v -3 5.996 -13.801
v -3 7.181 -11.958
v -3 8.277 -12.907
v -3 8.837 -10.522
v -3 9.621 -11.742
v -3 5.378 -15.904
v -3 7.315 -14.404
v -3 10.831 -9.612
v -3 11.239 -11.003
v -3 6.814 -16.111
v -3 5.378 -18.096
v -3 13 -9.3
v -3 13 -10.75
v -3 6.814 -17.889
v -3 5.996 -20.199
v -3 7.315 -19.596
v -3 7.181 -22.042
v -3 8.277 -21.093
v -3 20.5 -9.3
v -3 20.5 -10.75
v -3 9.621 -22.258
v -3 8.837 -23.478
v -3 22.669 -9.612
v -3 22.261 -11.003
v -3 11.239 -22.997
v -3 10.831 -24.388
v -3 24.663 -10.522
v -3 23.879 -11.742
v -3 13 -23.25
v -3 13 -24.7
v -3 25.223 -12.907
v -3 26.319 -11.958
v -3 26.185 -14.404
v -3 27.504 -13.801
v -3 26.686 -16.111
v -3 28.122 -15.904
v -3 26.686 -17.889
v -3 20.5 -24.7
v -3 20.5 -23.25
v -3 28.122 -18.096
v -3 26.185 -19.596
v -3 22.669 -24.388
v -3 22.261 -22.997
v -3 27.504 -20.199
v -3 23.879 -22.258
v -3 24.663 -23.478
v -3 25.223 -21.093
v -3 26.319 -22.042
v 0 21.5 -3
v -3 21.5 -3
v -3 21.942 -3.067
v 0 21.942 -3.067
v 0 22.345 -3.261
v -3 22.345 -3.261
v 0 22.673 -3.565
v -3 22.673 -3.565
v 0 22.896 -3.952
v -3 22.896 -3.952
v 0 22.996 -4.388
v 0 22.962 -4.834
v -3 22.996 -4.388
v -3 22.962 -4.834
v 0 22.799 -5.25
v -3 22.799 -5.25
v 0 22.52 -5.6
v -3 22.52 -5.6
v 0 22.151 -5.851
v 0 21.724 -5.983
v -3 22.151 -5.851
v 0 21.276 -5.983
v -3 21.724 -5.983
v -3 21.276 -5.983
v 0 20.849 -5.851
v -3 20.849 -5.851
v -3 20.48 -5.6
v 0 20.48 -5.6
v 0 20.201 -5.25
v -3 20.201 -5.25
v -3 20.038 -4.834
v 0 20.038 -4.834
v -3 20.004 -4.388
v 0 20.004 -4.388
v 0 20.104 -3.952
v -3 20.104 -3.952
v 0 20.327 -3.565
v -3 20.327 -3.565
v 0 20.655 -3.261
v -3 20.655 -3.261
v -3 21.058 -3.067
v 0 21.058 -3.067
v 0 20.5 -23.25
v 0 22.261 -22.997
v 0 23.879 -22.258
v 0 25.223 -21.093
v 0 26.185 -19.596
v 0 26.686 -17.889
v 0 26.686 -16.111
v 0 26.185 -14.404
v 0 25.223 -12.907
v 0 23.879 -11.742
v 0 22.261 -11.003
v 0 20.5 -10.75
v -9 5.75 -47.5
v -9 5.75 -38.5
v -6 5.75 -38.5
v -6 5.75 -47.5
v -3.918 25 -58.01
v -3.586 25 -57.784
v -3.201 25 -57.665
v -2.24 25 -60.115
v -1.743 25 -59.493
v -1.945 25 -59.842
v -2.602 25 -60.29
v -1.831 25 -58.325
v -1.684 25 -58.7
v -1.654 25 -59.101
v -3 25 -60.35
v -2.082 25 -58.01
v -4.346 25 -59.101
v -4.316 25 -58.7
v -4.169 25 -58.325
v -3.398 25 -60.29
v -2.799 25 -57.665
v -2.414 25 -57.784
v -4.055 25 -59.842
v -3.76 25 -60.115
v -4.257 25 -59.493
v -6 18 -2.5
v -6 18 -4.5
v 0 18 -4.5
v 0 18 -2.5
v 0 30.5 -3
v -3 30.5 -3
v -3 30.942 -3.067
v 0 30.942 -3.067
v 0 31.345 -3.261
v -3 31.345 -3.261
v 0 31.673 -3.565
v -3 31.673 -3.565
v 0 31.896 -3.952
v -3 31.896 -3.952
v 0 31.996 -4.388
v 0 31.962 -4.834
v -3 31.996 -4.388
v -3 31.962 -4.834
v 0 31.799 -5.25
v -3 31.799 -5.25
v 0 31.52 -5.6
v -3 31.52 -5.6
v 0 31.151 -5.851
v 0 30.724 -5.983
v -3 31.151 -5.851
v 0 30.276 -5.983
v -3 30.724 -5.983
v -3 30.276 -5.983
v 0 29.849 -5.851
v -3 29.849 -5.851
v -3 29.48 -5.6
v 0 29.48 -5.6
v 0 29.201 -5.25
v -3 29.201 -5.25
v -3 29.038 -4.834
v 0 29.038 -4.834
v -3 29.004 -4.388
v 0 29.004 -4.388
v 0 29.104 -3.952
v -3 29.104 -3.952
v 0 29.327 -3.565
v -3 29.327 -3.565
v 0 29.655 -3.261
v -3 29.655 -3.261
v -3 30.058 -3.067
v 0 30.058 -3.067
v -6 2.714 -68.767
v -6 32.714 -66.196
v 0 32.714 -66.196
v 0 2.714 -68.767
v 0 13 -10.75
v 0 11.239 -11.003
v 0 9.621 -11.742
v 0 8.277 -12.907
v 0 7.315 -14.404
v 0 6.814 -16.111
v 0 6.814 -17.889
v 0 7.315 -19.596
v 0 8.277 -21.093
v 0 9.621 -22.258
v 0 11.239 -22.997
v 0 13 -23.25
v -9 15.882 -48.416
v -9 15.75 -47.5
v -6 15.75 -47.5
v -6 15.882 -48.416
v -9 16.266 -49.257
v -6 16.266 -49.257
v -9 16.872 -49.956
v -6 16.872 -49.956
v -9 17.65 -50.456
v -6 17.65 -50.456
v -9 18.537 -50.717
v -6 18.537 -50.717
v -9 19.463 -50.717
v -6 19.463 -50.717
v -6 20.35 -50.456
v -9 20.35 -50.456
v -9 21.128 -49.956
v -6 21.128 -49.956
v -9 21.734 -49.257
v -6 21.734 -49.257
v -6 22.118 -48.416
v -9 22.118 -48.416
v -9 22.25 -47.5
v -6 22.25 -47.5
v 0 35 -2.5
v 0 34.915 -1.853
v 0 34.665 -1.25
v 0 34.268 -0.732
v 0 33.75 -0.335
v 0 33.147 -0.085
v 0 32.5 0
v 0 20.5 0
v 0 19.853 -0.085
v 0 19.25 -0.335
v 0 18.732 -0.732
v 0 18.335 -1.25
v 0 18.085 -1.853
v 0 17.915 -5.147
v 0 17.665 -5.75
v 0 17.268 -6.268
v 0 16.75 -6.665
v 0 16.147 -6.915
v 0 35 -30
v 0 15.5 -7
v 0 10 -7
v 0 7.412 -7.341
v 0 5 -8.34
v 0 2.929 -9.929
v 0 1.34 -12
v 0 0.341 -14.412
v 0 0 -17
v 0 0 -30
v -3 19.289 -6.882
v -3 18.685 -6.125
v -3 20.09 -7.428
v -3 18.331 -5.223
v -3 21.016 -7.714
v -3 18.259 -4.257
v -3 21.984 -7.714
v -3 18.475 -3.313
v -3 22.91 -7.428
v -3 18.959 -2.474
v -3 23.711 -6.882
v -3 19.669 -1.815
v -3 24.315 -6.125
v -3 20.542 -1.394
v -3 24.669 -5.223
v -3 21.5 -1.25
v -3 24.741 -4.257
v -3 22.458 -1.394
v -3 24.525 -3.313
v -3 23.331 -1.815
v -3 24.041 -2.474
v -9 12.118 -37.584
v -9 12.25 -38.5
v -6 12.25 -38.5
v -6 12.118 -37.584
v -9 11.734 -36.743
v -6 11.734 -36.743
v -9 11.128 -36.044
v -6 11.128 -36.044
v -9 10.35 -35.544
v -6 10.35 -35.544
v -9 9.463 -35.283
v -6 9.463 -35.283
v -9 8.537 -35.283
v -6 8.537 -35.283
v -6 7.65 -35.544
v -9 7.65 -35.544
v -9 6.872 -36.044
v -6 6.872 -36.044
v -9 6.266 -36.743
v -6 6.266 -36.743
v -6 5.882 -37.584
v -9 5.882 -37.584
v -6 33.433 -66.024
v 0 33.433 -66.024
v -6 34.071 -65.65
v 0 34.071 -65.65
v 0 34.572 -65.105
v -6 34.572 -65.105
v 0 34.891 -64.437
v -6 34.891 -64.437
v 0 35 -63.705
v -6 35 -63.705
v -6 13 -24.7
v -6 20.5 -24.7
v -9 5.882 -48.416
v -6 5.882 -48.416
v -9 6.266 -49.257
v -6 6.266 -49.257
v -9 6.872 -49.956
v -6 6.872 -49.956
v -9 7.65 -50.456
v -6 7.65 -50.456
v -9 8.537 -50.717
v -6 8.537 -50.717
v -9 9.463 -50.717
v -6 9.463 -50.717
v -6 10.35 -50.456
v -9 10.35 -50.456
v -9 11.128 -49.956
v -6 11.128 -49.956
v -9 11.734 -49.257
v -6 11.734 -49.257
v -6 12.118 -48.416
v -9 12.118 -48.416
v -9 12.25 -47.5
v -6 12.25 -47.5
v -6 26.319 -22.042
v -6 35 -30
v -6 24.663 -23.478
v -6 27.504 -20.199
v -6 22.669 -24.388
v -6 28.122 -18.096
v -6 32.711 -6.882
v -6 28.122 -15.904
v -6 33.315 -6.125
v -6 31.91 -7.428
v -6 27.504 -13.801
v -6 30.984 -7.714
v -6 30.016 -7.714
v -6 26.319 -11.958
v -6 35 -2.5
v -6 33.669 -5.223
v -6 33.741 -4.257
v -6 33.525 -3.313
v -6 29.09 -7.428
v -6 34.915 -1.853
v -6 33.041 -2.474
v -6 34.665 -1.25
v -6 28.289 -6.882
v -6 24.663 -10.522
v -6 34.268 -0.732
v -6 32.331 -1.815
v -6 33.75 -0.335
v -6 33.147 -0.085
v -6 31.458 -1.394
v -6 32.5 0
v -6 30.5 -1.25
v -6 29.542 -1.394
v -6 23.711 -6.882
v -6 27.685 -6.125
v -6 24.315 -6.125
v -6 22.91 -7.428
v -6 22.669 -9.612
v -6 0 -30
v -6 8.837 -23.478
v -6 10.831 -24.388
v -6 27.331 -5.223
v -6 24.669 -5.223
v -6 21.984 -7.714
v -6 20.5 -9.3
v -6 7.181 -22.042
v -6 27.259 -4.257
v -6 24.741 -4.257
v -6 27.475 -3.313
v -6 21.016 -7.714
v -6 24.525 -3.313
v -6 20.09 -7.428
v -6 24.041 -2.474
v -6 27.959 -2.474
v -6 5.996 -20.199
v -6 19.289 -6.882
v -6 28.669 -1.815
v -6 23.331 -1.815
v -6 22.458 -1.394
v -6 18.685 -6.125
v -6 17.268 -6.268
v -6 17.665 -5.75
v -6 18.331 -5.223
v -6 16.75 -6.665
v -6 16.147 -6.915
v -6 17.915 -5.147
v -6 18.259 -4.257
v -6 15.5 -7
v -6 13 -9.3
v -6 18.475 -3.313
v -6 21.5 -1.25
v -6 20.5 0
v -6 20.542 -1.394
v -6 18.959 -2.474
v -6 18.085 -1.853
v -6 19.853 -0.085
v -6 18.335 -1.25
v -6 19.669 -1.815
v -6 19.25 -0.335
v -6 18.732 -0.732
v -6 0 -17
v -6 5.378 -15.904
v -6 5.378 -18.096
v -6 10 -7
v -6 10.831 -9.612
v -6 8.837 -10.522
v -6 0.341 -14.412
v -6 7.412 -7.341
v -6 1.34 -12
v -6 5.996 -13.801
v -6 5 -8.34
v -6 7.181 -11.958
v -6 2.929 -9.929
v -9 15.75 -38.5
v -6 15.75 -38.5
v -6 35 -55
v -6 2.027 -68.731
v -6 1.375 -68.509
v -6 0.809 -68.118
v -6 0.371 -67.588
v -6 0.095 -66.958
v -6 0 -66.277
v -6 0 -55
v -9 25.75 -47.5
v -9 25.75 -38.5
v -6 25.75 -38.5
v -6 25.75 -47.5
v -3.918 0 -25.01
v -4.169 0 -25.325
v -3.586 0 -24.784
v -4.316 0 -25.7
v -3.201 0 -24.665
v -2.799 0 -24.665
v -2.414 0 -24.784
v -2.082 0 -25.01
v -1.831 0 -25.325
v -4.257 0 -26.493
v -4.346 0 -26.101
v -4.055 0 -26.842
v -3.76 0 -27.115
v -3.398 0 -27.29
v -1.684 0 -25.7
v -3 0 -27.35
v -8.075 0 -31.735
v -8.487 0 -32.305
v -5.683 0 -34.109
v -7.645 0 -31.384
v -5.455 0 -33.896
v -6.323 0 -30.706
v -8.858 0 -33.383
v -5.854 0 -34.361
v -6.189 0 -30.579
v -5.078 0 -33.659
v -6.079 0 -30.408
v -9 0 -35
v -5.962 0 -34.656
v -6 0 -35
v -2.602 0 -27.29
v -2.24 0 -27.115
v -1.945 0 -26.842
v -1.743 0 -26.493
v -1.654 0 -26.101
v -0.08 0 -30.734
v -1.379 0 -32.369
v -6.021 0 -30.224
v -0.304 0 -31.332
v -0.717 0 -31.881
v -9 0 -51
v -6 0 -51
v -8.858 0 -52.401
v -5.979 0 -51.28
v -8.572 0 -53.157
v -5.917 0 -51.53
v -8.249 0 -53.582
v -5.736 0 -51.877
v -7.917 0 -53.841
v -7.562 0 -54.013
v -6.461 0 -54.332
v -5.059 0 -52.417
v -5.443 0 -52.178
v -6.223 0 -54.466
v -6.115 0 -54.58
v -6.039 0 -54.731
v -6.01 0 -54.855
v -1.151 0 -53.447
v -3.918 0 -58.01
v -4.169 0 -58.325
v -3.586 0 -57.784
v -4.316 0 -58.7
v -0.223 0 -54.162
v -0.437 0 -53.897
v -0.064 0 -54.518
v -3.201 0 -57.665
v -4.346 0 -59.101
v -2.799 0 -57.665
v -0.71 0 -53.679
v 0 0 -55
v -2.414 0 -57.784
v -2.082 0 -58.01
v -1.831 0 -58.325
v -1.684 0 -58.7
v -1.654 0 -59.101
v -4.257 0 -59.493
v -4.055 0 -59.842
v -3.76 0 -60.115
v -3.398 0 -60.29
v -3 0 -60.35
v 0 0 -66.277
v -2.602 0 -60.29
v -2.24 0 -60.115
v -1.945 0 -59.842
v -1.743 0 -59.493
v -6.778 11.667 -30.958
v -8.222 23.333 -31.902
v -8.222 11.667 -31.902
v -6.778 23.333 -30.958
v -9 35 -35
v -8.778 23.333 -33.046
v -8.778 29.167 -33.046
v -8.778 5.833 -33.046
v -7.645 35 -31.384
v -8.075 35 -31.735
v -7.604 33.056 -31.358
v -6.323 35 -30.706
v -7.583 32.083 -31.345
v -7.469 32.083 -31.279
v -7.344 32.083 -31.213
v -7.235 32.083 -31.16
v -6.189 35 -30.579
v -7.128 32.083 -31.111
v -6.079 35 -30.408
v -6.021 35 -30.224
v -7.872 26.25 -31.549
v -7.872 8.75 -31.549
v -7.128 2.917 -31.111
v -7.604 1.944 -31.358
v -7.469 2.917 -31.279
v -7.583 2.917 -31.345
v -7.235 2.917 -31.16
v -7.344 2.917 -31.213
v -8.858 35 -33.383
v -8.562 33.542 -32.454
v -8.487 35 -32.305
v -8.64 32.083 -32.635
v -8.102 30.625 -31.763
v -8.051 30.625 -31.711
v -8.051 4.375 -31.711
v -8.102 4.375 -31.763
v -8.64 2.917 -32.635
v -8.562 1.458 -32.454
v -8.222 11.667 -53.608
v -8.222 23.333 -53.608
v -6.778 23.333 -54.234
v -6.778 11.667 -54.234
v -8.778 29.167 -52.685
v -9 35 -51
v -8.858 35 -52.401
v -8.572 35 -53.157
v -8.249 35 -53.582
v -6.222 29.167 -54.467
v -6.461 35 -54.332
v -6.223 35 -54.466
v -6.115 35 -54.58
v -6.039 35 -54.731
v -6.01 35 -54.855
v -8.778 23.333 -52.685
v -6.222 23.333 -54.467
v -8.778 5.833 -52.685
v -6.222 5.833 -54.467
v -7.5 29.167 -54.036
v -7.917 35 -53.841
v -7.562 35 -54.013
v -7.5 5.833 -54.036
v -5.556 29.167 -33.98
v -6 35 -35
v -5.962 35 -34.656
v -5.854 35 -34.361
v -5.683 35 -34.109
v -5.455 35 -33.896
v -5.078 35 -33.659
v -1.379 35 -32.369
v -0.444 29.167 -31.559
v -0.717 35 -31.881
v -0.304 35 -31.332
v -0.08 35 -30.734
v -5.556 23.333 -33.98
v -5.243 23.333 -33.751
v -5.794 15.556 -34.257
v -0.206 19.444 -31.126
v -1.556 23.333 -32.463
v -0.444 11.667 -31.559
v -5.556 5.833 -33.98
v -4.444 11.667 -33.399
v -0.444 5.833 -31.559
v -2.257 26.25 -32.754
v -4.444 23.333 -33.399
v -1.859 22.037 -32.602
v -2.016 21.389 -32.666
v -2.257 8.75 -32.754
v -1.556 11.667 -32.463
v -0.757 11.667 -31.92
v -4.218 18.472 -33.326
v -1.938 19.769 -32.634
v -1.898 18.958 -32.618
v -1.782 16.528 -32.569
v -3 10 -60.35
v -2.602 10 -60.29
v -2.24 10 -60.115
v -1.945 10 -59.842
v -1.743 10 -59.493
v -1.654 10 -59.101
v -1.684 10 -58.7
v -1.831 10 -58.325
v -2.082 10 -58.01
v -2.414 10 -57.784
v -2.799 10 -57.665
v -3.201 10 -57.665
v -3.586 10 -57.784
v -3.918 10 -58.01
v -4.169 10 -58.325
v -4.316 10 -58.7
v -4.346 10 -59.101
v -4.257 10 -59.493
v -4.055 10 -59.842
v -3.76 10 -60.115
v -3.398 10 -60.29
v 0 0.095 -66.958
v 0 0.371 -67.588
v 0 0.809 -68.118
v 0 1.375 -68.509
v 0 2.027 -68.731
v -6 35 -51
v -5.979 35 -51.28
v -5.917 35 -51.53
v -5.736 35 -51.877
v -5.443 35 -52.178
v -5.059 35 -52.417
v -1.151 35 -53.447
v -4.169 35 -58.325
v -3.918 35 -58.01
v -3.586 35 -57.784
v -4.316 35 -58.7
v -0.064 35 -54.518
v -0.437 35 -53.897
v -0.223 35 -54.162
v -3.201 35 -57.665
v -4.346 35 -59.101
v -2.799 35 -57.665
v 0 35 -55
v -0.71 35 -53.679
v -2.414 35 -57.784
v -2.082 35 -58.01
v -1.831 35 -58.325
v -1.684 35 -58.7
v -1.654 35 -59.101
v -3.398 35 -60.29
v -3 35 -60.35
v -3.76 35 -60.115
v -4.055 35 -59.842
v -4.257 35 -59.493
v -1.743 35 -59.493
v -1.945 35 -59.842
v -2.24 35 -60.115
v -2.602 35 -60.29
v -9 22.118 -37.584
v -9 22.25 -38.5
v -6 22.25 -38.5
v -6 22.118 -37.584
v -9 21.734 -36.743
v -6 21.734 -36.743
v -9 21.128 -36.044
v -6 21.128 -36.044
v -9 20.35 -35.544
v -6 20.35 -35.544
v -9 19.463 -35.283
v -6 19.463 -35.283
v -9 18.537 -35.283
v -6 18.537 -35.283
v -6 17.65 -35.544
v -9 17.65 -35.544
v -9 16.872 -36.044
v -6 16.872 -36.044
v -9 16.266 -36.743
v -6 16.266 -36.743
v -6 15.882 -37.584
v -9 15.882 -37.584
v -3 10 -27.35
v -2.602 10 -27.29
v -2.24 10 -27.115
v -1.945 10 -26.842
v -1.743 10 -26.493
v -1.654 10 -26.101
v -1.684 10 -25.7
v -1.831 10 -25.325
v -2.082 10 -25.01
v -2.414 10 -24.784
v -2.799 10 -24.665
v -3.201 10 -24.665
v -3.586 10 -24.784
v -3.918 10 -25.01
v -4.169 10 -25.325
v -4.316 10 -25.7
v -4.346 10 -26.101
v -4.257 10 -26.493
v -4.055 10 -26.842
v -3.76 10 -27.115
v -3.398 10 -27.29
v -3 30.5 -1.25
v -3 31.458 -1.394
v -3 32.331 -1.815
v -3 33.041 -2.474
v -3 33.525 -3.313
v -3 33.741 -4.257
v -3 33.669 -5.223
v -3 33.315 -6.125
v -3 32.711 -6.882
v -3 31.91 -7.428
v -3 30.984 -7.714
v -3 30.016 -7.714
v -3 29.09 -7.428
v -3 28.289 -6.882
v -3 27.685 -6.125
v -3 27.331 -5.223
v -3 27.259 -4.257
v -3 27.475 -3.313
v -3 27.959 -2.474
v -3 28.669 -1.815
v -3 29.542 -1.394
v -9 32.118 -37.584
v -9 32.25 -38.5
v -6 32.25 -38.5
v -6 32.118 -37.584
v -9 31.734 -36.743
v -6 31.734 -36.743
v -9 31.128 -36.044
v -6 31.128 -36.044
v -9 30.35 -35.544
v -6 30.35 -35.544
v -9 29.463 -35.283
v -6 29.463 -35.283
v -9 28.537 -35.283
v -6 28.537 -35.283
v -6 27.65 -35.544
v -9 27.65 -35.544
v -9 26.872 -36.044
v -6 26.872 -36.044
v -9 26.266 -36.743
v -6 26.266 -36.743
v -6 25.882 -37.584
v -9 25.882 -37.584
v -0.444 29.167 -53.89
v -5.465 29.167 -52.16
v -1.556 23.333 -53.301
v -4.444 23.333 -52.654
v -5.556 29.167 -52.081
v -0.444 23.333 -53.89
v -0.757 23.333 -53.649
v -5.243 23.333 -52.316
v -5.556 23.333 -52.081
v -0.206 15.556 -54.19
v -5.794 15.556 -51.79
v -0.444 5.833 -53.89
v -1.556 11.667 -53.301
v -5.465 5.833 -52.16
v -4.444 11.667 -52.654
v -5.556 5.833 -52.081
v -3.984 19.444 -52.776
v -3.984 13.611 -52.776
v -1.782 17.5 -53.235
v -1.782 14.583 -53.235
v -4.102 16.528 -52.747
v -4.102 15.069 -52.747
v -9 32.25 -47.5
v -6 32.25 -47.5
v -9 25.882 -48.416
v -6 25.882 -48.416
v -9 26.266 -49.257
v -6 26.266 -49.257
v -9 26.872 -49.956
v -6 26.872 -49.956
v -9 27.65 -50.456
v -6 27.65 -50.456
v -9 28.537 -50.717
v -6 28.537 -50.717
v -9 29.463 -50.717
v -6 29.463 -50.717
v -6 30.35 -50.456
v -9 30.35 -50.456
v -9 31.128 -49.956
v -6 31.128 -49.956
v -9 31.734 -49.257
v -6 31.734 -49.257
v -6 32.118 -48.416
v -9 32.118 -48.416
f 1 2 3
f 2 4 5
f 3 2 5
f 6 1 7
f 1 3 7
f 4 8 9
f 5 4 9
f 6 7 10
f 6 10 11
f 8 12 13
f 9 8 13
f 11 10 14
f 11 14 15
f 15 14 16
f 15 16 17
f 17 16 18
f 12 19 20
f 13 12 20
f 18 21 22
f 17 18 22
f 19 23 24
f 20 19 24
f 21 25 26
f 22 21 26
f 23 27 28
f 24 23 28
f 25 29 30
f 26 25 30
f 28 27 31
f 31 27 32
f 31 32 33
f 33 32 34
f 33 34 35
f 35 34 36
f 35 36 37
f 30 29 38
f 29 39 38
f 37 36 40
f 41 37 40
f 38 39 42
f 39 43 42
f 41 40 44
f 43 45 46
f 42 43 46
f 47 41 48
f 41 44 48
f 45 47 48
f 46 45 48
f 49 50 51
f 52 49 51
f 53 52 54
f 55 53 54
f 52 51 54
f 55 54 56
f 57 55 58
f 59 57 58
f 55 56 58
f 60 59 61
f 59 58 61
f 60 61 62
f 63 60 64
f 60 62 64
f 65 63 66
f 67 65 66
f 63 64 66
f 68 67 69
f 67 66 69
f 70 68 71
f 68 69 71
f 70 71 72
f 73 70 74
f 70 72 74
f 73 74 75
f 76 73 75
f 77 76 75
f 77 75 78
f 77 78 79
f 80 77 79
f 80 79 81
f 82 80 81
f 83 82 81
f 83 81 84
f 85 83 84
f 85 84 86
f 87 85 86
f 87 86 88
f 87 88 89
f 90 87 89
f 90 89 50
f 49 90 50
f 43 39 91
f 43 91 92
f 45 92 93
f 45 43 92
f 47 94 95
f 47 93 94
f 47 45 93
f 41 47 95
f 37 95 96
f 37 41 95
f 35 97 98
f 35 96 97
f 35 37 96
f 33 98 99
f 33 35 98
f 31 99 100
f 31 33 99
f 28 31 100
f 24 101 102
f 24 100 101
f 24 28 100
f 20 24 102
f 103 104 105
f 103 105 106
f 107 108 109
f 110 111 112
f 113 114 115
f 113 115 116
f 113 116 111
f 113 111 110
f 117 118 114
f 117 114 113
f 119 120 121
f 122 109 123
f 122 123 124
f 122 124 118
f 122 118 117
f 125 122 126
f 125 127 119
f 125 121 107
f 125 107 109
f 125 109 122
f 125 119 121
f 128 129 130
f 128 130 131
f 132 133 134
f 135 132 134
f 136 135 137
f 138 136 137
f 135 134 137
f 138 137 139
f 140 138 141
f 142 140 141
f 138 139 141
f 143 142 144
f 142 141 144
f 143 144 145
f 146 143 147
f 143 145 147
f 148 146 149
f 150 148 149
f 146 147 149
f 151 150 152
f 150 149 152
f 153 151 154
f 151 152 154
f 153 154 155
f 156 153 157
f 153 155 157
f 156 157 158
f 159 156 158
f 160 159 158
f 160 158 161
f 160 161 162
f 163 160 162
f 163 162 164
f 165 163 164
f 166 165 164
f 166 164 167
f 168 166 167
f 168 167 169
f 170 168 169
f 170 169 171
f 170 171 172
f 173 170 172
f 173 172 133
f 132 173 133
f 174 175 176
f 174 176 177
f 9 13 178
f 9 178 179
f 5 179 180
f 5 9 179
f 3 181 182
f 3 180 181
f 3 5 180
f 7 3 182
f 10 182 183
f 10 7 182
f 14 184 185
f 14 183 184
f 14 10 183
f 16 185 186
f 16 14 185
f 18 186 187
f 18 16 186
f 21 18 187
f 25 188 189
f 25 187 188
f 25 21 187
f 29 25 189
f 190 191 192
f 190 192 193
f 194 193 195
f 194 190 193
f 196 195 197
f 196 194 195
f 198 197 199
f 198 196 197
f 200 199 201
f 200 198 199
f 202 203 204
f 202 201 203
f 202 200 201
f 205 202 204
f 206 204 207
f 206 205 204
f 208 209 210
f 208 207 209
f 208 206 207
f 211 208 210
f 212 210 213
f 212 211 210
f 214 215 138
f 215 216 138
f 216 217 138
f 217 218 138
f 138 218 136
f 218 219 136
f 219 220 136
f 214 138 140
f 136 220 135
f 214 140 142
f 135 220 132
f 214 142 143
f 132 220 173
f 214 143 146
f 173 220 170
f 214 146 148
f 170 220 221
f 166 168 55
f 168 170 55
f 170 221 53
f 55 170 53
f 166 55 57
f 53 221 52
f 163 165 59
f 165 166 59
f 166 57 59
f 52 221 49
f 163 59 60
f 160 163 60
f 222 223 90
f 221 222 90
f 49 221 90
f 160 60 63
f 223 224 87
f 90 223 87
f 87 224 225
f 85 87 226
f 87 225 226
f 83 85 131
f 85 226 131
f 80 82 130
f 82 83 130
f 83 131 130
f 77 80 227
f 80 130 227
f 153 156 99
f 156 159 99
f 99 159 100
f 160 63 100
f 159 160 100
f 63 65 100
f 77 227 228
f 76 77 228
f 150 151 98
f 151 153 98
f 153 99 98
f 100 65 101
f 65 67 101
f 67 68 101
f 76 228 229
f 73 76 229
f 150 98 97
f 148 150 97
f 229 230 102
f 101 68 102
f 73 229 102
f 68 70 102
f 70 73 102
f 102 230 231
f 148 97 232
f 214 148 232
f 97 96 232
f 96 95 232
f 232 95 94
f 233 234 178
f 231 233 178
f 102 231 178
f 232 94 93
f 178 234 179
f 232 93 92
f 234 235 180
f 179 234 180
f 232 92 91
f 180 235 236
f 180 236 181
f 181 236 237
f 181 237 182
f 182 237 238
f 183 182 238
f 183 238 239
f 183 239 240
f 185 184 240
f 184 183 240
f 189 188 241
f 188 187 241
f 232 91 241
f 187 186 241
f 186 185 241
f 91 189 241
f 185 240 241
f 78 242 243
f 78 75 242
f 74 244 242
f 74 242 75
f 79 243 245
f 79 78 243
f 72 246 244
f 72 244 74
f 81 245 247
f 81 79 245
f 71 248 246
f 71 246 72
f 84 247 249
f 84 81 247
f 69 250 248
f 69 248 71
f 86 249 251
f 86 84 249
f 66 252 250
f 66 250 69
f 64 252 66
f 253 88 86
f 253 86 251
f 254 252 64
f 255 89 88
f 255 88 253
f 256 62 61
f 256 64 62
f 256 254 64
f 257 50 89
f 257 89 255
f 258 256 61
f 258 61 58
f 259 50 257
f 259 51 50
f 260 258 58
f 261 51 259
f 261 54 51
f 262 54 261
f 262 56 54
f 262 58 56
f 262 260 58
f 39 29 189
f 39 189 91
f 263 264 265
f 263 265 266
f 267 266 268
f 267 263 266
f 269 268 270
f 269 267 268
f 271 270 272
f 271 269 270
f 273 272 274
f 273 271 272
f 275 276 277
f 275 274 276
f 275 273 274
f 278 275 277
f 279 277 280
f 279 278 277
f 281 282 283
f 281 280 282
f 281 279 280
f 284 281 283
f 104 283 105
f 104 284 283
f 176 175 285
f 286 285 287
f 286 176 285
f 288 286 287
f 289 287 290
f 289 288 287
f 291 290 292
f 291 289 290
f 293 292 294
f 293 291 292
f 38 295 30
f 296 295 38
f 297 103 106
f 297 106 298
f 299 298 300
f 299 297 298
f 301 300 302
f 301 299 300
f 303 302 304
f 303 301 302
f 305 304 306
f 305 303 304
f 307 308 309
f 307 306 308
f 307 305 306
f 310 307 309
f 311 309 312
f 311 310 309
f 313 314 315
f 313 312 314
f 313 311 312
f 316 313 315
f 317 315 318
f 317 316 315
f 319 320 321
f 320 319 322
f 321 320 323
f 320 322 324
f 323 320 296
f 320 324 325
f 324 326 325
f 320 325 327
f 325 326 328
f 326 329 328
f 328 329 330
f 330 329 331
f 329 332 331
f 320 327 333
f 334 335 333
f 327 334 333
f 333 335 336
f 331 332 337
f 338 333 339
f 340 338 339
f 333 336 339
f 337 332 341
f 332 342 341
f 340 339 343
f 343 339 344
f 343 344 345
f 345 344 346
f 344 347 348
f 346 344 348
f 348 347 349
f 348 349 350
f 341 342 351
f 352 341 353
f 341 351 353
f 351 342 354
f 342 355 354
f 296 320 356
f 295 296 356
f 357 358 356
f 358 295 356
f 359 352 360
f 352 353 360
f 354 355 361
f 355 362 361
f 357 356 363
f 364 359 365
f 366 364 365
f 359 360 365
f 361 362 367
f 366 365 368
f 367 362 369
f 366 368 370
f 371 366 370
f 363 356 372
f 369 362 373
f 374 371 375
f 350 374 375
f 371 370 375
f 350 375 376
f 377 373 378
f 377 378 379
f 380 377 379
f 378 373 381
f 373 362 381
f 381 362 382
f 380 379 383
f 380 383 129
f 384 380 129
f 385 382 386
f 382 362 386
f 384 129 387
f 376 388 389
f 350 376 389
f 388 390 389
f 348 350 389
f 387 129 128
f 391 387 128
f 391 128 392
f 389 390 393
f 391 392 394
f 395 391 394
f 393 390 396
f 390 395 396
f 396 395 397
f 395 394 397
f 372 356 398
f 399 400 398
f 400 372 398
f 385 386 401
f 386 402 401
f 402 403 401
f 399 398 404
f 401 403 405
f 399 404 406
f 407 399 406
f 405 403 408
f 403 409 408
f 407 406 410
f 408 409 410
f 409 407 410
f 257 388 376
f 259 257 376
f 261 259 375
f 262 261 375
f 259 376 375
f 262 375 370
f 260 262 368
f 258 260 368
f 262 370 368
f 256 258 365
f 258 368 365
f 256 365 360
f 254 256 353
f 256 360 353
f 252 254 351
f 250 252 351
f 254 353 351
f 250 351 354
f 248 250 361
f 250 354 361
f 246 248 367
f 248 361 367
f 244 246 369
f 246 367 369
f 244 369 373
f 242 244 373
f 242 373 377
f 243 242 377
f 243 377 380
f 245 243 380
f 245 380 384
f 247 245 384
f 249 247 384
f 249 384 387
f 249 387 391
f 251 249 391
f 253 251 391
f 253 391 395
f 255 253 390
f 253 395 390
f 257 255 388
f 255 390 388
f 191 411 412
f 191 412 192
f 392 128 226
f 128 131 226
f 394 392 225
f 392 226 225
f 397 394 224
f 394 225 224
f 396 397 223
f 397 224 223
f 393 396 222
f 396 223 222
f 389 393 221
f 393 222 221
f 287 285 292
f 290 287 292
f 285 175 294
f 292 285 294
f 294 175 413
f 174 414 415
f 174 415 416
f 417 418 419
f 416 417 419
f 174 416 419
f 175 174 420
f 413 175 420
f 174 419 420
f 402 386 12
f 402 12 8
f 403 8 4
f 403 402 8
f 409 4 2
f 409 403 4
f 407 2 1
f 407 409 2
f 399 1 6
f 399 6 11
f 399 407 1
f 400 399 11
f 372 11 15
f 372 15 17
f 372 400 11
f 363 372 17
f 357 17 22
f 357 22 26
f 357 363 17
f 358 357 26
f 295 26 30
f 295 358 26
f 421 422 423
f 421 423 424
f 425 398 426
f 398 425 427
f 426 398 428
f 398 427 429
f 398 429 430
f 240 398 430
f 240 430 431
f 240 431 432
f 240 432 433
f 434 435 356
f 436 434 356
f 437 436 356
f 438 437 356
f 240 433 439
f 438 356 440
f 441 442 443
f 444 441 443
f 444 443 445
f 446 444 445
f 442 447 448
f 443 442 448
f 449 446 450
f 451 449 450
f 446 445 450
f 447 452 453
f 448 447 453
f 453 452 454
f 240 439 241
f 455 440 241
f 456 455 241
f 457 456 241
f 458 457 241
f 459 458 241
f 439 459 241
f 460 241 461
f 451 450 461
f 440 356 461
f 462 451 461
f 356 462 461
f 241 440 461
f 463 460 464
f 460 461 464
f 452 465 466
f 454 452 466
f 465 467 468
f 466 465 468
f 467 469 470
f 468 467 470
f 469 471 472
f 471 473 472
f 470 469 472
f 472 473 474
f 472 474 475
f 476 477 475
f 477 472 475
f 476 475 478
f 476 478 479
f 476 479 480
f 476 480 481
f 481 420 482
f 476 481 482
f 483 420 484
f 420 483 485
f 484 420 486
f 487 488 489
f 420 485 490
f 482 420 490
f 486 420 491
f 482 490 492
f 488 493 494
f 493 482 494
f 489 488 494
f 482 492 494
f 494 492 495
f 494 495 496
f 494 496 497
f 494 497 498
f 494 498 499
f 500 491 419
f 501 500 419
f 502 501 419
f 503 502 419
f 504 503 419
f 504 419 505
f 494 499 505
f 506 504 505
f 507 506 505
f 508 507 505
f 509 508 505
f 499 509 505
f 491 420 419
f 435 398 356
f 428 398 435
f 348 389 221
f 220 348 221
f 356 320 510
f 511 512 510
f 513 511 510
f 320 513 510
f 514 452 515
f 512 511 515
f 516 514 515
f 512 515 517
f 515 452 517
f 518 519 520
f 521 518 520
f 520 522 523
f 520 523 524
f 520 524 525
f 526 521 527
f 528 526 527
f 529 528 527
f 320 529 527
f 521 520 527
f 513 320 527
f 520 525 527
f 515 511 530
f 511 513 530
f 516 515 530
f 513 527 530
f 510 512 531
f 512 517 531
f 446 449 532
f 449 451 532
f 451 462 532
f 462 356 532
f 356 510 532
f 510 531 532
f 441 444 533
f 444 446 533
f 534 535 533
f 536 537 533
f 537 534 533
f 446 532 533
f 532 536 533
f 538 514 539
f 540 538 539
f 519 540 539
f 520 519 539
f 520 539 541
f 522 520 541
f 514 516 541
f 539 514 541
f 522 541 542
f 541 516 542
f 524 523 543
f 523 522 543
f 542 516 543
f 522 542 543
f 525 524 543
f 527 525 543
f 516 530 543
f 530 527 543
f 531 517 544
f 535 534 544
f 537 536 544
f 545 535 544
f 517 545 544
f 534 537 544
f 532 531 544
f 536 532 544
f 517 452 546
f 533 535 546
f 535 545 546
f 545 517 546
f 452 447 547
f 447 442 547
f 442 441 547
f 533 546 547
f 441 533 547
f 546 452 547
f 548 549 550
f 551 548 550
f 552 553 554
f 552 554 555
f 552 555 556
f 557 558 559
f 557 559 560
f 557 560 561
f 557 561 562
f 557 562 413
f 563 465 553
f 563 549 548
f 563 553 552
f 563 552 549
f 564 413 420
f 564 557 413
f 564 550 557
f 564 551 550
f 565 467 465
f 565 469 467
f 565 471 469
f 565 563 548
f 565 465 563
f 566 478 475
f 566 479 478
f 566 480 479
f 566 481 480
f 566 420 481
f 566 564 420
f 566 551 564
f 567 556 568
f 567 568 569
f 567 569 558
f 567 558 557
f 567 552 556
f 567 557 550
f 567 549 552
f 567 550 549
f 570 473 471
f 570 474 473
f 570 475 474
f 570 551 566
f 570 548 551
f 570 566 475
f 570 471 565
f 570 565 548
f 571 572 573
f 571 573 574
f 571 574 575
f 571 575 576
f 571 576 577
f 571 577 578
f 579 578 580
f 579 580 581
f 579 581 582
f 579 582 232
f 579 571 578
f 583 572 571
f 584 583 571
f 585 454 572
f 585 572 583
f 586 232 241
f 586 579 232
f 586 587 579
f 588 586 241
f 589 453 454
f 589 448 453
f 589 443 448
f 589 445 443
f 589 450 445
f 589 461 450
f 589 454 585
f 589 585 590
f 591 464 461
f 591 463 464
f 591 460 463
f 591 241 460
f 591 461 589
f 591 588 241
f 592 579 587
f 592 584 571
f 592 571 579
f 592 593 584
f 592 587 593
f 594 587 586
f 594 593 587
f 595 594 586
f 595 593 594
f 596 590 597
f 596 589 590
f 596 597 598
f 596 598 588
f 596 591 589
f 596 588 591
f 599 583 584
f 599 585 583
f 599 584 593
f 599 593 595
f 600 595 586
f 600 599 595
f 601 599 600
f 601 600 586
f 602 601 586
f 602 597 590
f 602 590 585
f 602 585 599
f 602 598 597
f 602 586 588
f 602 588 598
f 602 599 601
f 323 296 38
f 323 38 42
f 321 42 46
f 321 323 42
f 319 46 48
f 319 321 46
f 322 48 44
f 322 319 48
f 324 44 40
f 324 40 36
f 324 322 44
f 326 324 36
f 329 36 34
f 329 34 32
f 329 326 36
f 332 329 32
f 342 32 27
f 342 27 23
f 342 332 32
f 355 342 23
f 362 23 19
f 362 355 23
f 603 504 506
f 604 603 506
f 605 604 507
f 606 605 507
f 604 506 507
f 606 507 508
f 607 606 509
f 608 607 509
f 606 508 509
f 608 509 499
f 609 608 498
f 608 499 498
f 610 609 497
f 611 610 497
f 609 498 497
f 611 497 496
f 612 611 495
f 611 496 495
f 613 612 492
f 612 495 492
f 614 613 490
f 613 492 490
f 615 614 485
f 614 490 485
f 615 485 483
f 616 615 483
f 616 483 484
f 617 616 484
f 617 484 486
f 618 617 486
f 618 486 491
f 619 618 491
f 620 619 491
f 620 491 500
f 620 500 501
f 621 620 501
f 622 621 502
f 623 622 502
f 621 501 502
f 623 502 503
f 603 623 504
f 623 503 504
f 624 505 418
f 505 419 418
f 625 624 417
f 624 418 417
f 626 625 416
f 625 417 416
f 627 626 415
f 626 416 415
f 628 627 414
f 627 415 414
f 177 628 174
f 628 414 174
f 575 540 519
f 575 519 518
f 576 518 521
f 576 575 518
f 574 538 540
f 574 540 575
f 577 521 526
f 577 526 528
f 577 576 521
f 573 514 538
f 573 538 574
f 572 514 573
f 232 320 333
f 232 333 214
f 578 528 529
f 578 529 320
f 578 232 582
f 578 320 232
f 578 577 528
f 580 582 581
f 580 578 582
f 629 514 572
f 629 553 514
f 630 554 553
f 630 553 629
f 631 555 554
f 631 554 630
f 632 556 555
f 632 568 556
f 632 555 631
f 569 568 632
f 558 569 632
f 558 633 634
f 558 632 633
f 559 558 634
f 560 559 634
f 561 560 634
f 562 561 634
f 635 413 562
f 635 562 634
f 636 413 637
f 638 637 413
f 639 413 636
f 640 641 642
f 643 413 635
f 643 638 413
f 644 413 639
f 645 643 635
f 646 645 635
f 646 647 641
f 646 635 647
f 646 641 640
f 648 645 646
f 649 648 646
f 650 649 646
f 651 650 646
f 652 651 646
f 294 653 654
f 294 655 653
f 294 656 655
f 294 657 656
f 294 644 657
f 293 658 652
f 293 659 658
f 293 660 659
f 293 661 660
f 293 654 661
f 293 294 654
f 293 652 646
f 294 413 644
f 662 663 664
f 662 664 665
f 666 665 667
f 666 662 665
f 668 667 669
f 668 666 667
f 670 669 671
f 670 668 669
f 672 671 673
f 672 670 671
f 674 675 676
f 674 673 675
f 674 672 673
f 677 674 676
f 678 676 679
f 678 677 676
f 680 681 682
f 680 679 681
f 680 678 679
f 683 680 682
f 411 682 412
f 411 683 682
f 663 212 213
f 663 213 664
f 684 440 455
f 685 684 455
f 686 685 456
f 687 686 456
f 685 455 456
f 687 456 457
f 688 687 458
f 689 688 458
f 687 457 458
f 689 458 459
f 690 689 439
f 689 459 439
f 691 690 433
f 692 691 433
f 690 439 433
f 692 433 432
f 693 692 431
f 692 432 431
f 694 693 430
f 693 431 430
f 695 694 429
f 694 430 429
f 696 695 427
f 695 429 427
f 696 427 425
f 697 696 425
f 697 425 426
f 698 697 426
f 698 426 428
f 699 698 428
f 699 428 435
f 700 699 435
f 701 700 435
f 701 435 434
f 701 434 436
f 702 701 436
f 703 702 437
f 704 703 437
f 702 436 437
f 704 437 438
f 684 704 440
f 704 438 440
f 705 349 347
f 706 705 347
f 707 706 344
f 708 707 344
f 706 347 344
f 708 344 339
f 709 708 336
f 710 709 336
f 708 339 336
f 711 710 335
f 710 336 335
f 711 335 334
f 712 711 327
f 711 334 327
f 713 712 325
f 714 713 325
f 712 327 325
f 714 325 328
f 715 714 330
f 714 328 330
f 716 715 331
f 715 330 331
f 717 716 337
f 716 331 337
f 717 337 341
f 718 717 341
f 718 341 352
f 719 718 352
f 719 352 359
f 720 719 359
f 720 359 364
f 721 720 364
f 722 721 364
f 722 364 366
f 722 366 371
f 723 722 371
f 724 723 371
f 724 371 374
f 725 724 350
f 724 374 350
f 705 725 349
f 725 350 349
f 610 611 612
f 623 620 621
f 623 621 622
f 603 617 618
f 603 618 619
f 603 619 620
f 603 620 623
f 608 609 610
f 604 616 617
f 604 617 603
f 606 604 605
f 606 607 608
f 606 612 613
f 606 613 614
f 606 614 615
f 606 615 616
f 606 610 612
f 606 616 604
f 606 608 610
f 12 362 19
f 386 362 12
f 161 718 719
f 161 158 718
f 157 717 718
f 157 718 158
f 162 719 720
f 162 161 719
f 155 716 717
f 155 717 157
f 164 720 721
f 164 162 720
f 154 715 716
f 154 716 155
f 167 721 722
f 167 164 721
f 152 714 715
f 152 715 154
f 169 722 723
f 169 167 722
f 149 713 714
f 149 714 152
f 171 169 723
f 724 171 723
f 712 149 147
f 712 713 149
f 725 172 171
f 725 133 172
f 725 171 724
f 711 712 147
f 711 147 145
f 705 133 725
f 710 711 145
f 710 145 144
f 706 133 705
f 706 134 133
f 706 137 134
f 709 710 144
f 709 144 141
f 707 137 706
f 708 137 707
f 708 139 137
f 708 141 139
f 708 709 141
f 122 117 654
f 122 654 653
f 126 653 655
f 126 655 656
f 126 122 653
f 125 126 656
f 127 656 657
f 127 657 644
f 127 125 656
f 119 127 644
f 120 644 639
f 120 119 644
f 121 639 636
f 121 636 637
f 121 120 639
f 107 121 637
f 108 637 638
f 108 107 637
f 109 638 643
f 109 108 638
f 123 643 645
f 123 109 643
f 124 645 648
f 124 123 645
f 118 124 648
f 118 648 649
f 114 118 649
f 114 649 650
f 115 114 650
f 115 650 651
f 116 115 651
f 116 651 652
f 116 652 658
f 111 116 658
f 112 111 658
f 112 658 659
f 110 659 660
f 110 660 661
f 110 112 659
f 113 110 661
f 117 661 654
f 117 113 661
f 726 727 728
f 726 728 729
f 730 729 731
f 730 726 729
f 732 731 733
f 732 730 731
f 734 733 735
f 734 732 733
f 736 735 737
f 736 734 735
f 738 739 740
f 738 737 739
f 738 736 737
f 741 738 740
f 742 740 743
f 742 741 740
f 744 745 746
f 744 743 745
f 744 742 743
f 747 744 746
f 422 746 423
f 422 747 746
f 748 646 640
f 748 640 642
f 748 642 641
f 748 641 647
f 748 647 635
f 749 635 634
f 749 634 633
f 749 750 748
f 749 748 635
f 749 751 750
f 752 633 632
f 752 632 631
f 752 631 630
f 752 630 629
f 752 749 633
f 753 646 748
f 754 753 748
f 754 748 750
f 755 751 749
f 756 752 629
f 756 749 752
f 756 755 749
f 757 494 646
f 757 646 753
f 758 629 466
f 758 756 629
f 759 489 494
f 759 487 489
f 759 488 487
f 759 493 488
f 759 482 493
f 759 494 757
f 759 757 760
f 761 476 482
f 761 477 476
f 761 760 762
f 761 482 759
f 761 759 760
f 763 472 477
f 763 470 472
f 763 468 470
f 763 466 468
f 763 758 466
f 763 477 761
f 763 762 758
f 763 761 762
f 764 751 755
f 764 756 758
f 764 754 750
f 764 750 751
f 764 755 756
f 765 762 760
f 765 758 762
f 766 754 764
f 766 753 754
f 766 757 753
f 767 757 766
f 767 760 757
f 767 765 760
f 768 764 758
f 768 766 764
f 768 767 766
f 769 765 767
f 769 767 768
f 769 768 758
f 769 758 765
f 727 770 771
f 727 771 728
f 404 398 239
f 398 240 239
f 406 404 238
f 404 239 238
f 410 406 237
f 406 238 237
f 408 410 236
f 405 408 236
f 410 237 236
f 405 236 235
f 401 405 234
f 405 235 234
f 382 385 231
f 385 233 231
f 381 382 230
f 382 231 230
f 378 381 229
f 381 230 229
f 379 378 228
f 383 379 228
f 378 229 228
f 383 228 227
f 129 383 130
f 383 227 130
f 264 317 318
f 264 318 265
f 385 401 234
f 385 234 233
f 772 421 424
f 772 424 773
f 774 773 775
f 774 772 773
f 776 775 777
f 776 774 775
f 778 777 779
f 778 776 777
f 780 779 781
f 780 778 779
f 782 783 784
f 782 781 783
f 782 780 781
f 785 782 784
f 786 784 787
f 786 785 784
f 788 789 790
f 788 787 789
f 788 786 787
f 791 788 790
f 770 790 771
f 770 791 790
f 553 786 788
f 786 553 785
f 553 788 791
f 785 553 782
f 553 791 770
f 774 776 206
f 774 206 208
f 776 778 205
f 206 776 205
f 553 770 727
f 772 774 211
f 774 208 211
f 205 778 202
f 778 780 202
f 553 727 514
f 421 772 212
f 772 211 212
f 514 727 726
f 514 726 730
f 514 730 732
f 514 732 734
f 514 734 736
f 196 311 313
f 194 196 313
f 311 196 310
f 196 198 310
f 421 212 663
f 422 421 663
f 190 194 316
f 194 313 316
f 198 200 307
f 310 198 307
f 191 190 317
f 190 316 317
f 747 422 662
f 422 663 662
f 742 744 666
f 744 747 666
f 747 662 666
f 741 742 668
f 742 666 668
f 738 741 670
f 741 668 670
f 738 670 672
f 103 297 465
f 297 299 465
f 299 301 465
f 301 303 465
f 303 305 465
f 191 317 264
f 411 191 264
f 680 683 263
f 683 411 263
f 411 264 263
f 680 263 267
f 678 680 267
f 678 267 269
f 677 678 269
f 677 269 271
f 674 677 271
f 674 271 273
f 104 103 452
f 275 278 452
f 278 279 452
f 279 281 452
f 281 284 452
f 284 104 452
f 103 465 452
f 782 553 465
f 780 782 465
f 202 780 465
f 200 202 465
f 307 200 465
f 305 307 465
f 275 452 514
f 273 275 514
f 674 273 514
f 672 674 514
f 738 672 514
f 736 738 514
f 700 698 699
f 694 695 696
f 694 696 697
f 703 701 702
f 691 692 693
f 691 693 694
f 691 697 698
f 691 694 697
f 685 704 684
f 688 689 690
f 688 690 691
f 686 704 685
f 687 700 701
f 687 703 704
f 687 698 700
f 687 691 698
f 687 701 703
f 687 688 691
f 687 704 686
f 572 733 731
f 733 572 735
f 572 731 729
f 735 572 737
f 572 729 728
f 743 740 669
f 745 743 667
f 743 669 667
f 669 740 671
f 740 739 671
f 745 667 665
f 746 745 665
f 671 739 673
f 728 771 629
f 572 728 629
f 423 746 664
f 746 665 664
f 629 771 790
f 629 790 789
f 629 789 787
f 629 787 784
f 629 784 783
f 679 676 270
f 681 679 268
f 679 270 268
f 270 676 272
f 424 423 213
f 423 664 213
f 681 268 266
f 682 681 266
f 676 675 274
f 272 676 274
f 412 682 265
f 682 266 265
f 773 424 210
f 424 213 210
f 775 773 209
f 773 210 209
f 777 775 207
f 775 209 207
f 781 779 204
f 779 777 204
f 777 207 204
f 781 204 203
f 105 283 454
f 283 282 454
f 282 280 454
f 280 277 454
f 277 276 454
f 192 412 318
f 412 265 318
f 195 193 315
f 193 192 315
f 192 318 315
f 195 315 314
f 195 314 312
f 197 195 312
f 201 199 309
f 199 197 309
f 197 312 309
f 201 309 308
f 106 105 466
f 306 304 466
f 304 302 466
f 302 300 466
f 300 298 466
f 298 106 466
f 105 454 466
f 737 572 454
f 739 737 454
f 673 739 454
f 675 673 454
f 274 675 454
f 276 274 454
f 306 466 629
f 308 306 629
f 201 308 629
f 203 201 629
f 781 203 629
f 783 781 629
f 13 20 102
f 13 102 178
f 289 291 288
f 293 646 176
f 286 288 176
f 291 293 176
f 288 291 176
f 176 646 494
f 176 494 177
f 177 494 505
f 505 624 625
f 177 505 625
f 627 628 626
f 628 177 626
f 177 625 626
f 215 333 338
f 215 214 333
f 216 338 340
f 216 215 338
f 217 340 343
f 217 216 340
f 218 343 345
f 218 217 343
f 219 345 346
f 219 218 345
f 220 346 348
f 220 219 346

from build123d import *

# Parameters (mm, degrees)
BOSS_EXTRUDE1_DEPTH = 35
CUT_EXTRUDE1_REACH  = 79.891
SKETCH4_R           = 1.5
SKETCH4_W           = 7
SKETCH4_H           = 18
SKETCH7_R           = 3.25
CUT_EXTRUDE2_DEPTH  = 3
SKETCH10_R          = 1.35
CUT_EXTRUDE3_DEPTH  = 10
CUT_EXTRUDE4_START  = -10
SKETCH11_R          = 1.35
CUT_EXTRUDE4_DEPTH  = 10
FILLET1_R           = 2.5
FILLET2_R           = 10


with BuildPart() as part:
    # Sketch3 → Boss-Extrude1 (new body)
    with BuildSketch(Plane(origin=(0, 0, 0), x_dir=(1, 0, 0), z_dir=(0, 1, 0))):
        with BuildLine():
            Line((0, 69), (-6, 69))
            Line((-6, 69), (-6, 55))
            add(Edge.make_bspline(
                [(-9, 51), (-9, 55.307083004), (-6, 53.455748632), (-6, 55)],
                knots=[0, 0, 0, 0, 1, 1, 1, 1], degree=3))
            Line((-9, 51), (-9, 35))
            add(Edge.make_bspline(
                [(-9, 35), (-9, 30.102050716), (-6, 31.687720833), (-6, 30)],
                knots=[0, 0, 0, 0, 1, 1, 1, 1], degree=3))
            Line((-6, 30), (-6, 0))
            Line((-6, 0), (0, 0))
            Line((0, 0), (0, 30))
            add(Edge.make_bspline(
                [(-6, 35), (-6, 32.33641875), (0, 33.956398937), (0, 30)],
                knots=[0, 0, 0, 0, 1, 1, 1, 1], degree=3))
            Line((-6, 35), (-6, 51))
            add(Edge.make_bspline(
                [(0, 55), (0, 52.08873611), (-6, 53.842765247), (-6, 51)],
                knots=[0, 0, 0, 0, 1, 1, 1, 1], degree=3))
            Line((0, 55), (0, 69))
        make_face()
    extrude(amount=BOSS_EXTRUDE1_DEPTH)

    # Sketch4 → Cut-Extrude1 (cut, up to next)
    with BuildSketch(Plane.ZY.offset(9), mode=Mode.PRIVATE) as cut_extrude1_sk1:
        with Locations((-4.5, 30.5)):
            Circle(SKETCH4_R)
    cut_extrude1_tool1 = extrude(cut_extrude1_sk1.sketch, amount=-CUT_EXTRUDE1_REACH, mode=Mode.PRIVATE) & part.part
    # Sketch4 → Cut-Extrude1 (cut, up to next)
    with BuildSketch(Plane.ZY.offset(9), mode=Mode.PRIVATE) as cut_extrude1_sk2:
        with Locations((-4.5, 21.5)):
            Circle(SKETCH4_R)
    cut_extrude1_tool2 = extrude(cut_extrude1_sk2.sketch, amount=-CUT_EXTRUDE1_REACH, mode=Mode.PRIVATE) & part.part
    # Sketch4 → Cut-Extrude1 (cut, up to next)
    with BuildSketch(Plane.ZY.offset(9), mode=Mode.PRIVATE) as cut_extrude1_sk3:
        Polygon((-69, 35), (-66, 35), (-69, 0), align=None)
    cut_extrude1_tool3 = extrude(cut_extrude1_sk3.sketch, amount=-CUT_EXTRUDE1_REACH, mode=Mode.PRIVATE) & part.part
    # Sketch4 → Cut-Extrude1 (cut, up to next)
    with BuildSketch(Plane.ZY.offset(9), mode=Mode.PRIVATE) as cut_extrude1_sk4:
        with BuildLine():
            Line((-47.5, 32.25), (-38.5, 32.25))
            ThreePointArc((-38.5, 32.25), (-35.25, 29), (-38.5, 25.75))
            Line((-38.5, 25.75), (-47.5, 25.75))
            ThreePointArc((-47.5, 25.75), (-50.75, 29), (-47.5, 32.25))
        make_face()
    cut_extrude1_tool4 = extrude(cut_extrude1_sk4.sketch, amount=-CUT_EXTRUDE1_REACH, mode=Mode.PRIVATE) & part.part
    # Sketch4 → Cut-Extrude1 (cut, up to next)
    with BuildSketch(Plane.ZY.offset(9), mode=Mode.PRIVATE) as cut_extrude1_sk5:
        with BuildLine():
            Line((-47.5, 22.25), (-38.5, 22.25))
            ThreePointArc((-38.5, 22.25), (-35.25, 19), (-38.5, 15.75))
            Line((-38.5, 15.75), (-47.5, 15.75))
            ThreePointArc((-47.5, 15.75), (-50.75, 19), (-47.5, 22.25))
        make_face()
    cut_extrude1_tool5 = extrude(cut_extrude1_sk5.sketch, amount=-CUT_EXTRUDE1_REACH, mode=Mode.PRIVATE) & part.part
    # Sketch4 → Cut-Extrude1 (cut, up to next)
    with BuildSketch(Plane.ZY.offset(9), mode=Mode.PRIVATE) as cut_extrude1_sk6:
        with BuildLine():
            Line((-47.5, 12.25), (-38.5, 12.25))
            ThreePointArc((-38.5, 12.25), (-35.25, 9), (-38.5, 5.75))
            Line((-38.5, 5.75), (-47.5, 5.75))
            ThreePointArc((-47.5, 5.75), (-50.75, 9), (-47.5, 12.25))
        make_face()
    cut_extrude1_tool6 = extrude(cut_extrude1_sk6.sketch, amount=-CUT_EXTRUDE1_REACH, mode=Mode.PRIVATE) & part.part
    # Sketch4 → Cut-Extrude1 (cut, up to next)
    with BuildSketch(Plane.ZY.offset(9), mode=Mode.PRIVATE) as cut_extrude1_sk7:
        with Locations((-3.5, 9)):
            Rectangle(SKETCH4_W, SKETCH4_H)
    cut_extrude1_tool7 = extrude(cut_extrude1_sk7.sketch, amount=-CUT_EXTRUDE1_REACH, mode=Mode.PRIVATE) & part.part
    # Sketch4 → Cut-Extrude1 (cut, up to next)
    with BuildSketch(Plane.ZY.offset(9), mode=Mode.PRIVATE) as cut_extrude1_sk8:
        with BuildLine():
            Line((-10.75, 20.5), (-10.75, 13))
            ThreePointArc((-10.75, 13), (-17, 6.75), (-23.25, 13))
            Line((-23.25, 13), (-23.25, 20.5))
            ThreePointArc((-23.25, 20.5), (-17, 26.75), (-10.75, 20.5))
        make_face()
    cut_extrude1_tool8 = extrude(cut_extrude1_sk8.sketch, amount=-CUT_EXTRUDE1_REACH, mode=Mode.PRIVATE) & part.part
    add(cut_extrude1_tool1.solids().sort_by_distance((-9, 30.5, -4.5))[0], mode=Mode.SUBTRACT)
    add(cut_extrude1_tool2.solids().sort_by_distance((-9, 21.5, -4.5))[0], mode=Mode.SUBTRACT)
    add(cut_extrude1_tool3.solids().sort_by_distance((-9, 23.333333, -68))[0], mode=Mode.SUBTRACT)
    add(cut_extrude1_tool4.solids().sort_by_distance((-9, 29, -43))[0], mode=Mode.SUBTRACT)
    add(cut_extrude1_tool5.solids().sort_by_distance((-9, 19, -43))[0], mode=Mode.SUBTRACT)
    add(cut_extrude1_tool6.solids().sort_by_distance((-9, 9, -43))[0], mode=Mode.SUBTRACT)
    add(cut_extrude1_tool7.solids().sort_by_distance((-9, 9, -3.5))[0], mode=Mode.SUBTRACT)
    add(cut_extrude1_tool8.solids().sort_by_distance((-9, 16.75, -17))[0], mode=Mode.SUBTRACT)

    # Sketch7 → Cut-Extrude2 (cut)
    with BuildSketch(Plane.ZY.offset(6)):
        with Locations((-4.5, 30.5)):
            Circle(SKETCH7_R)
        with Locations((-4.5, 21.5)):
            Circle(SKETCH7_R)
        with BuildLine():
            Line((-9.3, 20.5), (-9.3, 13))
            ThreePointArc((-9.3, 13), (-17, 5.3), (-24.7, 13))
            Line((-24.7, 13), (-24.7, 20.5))
            ThreePointArc((-24.7, 20.5), (-17, 28.2), (-9.3, 20.5))
        make_face()
    extrude(amount=-CUT_EXTRUDE2_DEPTH, mode=Mode.SUBTRACT)

    # Sketch10 → Cut-Extrude3 (cut)
    with BuildSketch(Plane.XZ):
        with Locations(Location((-3, -59, 0), (0, 0, 270))):
            Circle(SKETCH10_R)
        with Locations(Location((-3, -26, 0), (0, 0, 270))):
            Circle(SKETCH10_R)
    extrude(amount=-CUT_EXTRUDE3_DEPTH, mode=Mode.SUBTRACT)

    # Sketch11 → Cut-Extrude4 (cut)
    with BuildSketch(Plane(origin=(0, 35, 0), x_dir=(1, 0, 0), z_dir=(0, 1, 0)).offset(CUT_EXTRUDE4_START)):
        with Locations(Location((-3, 59, 0), (0, 0, 90))):
            Circle(SKETCH11_R)
    extrude(amount=CUT_EXTRUDE4_DEPTH, mode=Mode.SUBTRACT)

    # Fillet1
    fillet1_edges = [part.edges().sort_by_distance(p)[0] for p in [
        (-3, 0, -69),
        (-3, 35, 0),
        (-3, 35, -66),
        (-3, 18, 0),
        (-3, 18, -7),
    ]]
    fillet(fillet1_edges, radius=FILLET1_R)

    # Fillet2
    fillet2_edges = [part.edges().sort_by_distance(p)[0] for p in [
        (-3, 0, -7),
    ]]
    fillet(fillet2_edges, radius=FILLET2_R)


solid = part.part
